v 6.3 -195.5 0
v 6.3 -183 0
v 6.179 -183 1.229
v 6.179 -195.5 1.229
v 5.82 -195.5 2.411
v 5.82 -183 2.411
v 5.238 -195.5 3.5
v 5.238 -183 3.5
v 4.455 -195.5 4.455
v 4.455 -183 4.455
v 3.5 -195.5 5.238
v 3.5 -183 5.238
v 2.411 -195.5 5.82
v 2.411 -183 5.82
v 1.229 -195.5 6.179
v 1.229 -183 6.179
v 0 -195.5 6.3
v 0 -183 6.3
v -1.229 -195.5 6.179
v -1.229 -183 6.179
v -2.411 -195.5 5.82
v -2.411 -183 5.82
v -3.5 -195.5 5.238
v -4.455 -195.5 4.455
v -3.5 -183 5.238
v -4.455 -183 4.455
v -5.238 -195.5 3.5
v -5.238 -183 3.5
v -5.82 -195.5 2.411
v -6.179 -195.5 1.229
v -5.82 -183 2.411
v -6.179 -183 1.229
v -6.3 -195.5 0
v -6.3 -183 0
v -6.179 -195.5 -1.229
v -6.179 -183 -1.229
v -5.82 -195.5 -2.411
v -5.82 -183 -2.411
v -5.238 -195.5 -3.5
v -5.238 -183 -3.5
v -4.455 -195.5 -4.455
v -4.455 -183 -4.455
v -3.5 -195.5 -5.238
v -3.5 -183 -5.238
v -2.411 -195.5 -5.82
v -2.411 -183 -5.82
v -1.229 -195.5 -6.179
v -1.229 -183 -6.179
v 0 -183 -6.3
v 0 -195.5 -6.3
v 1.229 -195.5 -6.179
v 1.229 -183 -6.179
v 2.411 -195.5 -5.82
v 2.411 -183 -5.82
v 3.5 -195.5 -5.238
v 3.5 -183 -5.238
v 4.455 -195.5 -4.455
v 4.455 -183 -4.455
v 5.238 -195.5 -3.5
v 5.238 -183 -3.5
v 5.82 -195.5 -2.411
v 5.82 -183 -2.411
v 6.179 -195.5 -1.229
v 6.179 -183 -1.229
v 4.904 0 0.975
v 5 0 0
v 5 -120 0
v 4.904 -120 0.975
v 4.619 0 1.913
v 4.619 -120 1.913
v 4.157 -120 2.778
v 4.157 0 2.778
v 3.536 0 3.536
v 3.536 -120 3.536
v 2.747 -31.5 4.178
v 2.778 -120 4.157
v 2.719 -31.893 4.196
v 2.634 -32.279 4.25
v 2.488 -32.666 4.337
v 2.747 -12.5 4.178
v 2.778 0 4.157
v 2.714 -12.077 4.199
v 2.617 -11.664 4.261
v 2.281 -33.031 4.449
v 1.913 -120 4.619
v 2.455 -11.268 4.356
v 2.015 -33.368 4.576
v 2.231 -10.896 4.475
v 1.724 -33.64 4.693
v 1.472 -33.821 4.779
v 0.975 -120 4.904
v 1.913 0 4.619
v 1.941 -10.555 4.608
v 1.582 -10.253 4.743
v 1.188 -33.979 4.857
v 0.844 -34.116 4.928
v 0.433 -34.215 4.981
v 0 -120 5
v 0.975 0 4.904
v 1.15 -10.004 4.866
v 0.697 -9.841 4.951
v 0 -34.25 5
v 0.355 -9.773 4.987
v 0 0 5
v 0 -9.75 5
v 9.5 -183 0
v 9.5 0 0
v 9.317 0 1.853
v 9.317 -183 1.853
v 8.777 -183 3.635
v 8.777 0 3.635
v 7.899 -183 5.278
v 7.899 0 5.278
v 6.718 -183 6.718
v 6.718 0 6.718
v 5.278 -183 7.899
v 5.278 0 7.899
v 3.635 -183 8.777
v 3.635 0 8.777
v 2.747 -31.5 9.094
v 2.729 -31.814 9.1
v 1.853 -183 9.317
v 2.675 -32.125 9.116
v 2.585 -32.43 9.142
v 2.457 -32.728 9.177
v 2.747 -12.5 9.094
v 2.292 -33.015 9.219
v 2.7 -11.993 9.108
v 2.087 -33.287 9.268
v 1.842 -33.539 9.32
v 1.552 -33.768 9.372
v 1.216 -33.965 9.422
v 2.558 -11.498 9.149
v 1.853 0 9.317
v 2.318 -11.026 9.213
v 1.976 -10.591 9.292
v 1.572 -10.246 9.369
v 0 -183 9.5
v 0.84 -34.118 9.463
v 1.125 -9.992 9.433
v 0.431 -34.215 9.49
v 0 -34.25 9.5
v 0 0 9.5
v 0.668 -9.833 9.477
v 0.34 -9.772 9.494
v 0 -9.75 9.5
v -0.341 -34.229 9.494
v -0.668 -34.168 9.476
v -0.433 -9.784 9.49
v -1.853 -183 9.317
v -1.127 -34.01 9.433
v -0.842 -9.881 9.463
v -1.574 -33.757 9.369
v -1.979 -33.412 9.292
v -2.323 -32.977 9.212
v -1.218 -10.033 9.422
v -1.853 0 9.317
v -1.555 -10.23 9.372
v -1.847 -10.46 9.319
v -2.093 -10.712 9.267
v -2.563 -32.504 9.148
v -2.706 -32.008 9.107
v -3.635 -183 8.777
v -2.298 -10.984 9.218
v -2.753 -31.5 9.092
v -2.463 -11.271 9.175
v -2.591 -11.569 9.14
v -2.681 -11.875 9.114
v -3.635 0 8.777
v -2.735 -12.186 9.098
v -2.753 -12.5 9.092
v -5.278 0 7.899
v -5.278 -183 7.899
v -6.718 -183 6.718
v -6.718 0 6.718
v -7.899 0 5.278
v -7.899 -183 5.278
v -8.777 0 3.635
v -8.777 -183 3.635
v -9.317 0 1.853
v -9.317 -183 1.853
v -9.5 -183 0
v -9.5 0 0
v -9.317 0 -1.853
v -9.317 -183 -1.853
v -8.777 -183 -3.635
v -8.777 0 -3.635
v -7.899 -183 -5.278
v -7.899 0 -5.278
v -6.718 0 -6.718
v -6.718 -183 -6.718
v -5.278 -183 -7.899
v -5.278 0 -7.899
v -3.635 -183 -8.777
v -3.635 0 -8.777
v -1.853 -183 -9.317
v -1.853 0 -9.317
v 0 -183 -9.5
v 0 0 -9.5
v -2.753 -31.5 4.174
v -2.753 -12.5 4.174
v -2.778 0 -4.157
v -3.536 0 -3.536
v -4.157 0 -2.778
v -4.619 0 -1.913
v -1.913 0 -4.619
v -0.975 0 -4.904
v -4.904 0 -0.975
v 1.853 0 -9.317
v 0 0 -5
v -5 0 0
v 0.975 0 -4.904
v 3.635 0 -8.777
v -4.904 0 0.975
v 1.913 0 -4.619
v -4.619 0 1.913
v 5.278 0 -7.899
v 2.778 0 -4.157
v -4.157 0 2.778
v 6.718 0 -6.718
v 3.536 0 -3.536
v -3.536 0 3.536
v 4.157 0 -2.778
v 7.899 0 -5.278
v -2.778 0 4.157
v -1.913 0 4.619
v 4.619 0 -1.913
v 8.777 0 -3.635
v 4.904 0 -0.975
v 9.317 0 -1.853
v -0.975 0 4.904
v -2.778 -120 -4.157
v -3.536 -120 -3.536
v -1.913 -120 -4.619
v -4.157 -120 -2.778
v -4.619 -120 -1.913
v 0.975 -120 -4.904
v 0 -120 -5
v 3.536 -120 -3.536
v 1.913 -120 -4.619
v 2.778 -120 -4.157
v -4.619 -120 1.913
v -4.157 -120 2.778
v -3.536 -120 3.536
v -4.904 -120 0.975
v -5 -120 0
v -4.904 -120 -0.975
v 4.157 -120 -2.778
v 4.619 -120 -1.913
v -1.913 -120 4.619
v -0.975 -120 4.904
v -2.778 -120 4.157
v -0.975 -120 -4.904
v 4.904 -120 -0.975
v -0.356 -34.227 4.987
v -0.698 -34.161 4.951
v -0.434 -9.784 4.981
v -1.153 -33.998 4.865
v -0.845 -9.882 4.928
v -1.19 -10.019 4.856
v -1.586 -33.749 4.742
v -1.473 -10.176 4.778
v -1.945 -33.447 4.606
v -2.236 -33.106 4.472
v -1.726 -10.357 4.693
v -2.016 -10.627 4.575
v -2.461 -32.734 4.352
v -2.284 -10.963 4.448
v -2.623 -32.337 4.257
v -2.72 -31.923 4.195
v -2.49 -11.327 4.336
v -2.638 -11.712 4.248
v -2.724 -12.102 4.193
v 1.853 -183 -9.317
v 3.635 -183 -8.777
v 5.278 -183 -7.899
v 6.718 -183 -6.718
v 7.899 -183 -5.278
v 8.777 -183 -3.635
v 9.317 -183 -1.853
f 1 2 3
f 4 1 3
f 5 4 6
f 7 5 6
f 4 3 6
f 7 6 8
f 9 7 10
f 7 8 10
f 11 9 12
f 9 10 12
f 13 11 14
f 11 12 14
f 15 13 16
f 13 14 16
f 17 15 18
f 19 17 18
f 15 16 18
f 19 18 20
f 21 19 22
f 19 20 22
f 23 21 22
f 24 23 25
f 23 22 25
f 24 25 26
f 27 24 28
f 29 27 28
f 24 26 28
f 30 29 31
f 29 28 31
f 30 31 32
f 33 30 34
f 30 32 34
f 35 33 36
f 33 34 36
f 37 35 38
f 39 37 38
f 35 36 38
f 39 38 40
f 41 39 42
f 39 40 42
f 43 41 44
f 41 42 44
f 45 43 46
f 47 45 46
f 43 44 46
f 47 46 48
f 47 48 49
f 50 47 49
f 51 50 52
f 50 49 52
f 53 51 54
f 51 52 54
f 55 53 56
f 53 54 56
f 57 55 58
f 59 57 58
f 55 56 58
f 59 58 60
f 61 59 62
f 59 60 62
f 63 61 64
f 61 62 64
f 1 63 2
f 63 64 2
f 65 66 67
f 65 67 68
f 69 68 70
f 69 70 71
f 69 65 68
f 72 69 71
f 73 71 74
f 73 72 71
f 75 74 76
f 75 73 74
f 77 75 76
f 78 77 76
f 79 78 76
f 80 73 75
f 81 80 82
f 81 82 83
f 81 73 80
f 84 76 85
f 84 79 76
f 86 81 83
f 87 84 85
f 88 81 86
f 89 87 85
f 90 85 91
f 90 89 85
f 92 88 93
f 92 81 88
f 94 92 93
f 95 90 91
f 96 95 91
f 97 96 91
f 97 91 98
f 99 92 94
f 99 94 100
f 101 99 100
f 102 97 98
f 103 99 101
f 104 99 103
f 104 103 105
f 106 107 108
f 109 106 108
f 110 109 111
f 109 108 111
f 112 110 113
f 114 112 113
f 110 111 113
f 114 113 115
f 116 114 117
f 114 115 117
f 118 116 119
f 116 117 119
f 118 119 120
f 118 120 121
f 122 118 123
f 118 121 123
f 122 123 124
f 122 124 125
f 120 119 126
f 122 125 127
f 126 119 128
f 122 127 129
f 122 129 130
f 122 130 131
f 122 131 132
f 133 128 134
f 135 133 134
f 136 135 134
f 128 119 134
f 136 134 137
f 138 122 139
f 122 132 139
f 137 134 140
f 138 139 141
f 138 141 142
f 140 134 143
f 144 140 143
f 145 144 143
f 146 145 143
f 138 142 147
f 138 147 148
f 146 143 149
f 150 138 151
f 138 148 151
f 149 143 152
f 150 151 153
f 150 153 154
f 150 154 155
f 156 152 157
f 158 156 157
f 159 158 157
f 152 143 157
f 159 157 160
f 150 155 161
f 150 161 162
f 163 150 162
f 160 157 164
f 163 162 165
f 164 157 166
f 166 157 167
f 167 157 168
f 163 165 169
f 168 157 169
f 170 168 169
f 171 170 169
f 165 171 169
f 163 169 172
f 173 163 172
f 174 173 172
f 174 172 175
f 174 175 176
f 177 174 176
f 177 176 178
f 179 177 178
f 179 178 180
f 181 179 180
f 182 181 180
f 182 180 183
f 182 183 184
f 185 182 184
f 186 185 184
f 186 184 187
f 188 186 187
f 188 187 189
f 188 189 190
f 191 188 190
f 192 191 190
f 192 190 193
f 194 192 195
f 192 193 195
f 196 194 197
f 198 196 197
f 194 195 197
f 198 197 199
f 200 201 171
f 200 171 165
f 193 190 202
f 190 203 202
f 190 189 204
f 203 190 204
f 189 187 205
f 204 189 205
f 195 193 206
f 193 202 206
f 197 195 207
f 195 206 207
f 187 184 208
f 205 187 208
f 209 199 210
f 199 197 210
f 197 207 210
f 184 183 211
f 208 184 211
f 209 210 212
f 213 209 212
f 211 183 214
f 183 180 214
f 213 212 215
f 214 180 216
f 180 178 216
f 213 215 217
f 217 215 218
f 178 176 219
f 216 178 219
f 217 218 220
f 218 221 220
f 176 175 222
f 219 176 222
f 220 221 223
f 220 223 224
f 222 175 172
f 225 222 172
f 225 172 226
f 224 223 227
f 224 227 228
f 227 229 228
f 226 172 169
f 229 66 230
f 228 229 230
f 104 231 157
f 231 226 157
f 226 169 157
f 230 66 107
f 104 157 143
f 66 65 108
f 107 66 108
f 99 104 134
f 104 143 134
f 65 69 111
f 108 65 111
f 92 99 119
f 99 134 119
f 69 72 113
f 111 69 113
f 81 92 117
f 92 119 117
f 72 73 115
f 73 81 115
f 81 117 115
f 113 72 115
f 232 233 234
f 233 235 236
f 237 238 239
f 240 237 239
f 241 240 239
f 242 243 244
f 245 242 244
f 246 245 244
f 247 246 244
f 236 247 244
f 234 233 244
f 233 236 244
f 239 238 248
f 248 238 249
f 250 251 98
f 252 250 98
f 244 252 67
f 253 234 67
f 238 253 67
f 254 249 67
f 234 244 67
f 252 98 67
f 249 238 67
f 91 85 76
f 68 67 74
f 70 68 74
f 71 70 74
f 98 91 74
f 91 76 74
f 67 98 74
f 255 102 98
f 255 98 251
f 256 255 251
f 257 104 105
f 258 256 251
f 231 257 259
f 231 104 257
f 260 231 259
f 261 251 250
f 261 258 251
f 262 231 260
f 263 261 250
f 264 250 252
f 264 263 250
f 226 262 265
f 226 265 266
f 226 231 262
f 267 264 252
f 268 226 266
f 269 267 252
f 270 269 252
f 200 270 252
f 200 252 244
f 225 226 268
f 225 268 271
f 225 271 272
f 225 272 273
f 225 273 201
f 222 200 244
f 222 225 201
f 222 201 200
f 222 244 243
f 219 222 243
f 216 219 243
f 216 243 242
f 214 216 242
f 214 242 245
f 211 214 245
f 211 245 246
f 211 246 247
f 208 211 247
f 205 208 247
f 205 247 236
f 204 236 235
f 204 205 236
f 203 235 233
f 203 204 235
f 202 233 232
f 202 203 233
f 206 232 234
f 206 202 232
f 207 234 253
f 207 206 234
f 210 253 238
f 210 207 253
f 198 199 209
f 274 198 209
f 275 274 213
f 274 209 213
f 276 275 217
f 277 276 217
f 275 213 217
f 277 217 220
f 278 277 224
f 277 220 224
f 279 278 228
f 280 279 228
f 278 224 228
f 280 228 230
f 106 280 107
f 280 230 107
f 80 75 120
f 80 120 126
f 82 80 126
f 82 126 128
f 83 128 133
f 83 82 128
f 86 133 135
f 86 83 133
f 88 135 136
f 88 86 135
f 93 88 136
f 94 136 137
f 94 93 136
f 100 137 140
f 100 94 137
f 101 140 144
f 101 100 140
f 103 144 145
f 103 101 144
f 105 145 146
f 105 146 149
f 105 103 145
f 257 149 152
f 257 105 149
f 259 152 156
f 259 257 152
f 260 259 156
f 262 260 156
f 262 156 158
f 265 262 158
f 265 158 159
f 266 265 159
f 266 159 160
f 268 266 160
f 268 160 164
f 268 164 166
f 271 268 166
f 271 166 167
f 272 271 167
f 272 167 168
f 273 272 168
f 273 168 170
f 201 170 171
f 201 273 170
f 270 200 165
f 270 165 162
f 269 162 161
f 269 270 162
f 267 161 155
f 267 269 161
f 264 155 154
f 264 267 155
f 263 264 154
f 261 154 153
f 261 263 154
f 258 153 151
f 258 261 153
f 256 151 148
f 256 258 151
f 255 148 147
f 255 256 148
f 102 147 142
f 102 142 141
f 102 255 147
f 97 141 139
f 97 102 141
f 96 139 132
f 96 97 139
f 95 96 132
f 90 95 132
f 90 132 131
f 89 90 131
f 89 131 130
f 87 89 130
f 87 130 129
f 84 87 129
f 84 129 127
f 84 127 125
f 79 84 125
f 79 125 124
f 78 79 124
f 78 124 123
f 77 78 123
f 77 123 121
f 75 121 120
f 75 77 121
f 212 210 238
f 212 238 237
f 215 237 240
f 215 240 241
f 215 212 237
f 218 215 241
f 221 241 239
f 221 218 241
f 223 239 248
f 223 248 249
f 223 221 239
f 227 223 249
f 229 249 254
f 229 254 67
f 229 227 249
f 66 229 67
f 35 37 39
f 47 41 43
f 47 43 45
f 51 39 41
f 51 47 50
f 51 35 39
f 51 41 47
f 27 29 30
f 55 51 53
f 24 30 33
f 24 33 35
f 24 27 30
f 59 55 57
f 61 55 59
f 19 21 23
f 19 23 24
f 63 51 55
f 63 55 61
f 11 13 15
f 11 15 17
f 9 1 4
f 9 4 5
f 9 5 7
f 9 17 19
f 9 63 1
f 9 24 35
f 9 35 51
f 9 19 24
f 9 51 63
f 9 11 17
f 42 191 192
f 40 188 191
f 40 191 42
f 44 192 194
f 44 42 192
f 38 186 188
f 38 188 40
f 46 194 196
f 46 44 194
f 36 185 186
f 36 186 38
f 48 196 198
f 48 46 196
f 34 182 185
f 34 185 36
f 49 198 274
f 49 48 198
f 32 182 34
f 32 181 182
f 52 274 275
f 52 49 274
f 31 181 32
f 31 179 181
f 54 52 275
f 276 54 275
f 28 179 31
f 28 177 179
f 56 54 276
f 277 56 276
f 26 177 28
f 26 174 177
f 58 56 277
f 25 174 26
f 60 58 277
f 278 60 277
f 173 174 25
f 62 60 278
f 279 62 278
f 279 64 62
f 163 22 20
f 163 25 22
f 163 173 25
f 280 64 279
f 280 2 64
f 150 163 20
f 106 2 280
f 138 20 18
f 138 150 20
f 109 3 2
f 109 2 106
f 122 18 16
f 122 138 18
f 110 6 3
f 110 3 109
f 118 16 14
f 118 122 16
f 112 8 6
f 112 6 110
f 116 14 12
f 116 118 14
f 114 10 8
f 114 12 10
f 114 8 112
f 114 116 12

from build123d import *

# Parameters (mm, degrees)
F1_DEPTH = 183
F2_DEPTH = 120
F4_DEPTH = 25
F5_R     = 6.3
F6_DEPTH = 12.5


with BuildPart() as f1:
    # F0 (on Front) → F1 (new body)
    with BuildSketch(Plane.XZ):
        with BuildLine():
            ThreePointArc((0, -9.5), (6.717514, -6.717514), (9.5, 0))
            ThreePointArc((9.5, 0), (6.717514, 6.717514), (0, 9.5))
            Line((0, 9.5), (0, 5))
            ThreePointArc((0, 5), (3.535534, 3.535534), (5, 0))
            ThreePointArc((5, 0), (3.535534, -3.535534), (0, -5))
            Line((0, -5), (0, -9.5))
        make_face()
        with BuildLine():
            ThreePointArc((5, 0), (3.535534, 3.535534), (0, 5))
            Line((0, 5), (0, -5))
            ThreePointArc((0, -5), (3.535534, -3.535534), (5, 0))
        make_face()
        with BuildLine():
            Line((0, -5), (0, 5))
            ThreePointArc((0, 5), (-5, 0), (0, -5))
        make_face()
        with BuildLine():
            Line((0, 5), (0, 9.5))
            ThreePointArc((0, 9.5), (-9.5, 0), (0, -9.5))
            Line((0, -9.5), (0, -5))
            ThreePointArc((0, -5), (-5, 0), (0, 5))
        make_face()
    extrude(amount=F1_DEPTH)

    # F0 (on Front) → F2 (cut)
    with BuildSketch(Plane.XZ):
        with BuildLine():
            ThreePointArc((5, 0), (3.535534, 3.535534), (0, 5))
            Line((0, 5), (0, -5))
            ThreePointArc((0, -5), (3.535534, -3.535534), (5, 0))
        make_face()
        with BuildLine():
            Line((0, -5), (0, 5))
            ThreePointArc((0, 5), (-5, 0), (0, -5))
        make_face()
    extrude(amount=F2_DEPTH, mode=Mode.SUBTRACT)

    # F3 (on Top) → F4 (cut)
    with BuildSketch(Plane.XY):
        with BuildLine():
            Line((2.746924, -31.5), (2.746924, -12.5))
            ThreePointArc((2.746924, -12.5), (-0.003076, -9.75), (-2.753076, -12.5))
            Line((-2.753076, -12.5), (-2.753076, -31.5))
            ThreePointArc((-2.753076, -31.5), (-0.003076, -34.25), (2.746924, -31.5))
        make_face()
    extrude(amount=F4_DEPTH, mode=Mode.SUBTRACT)

    # F5 (on face) → F6 (join)
    with BuildSketch(Plane.XZ.offset(183)):
        Circle(F5_R)
    extrude(amount=F6_DEPTH)


solid = f1.part
